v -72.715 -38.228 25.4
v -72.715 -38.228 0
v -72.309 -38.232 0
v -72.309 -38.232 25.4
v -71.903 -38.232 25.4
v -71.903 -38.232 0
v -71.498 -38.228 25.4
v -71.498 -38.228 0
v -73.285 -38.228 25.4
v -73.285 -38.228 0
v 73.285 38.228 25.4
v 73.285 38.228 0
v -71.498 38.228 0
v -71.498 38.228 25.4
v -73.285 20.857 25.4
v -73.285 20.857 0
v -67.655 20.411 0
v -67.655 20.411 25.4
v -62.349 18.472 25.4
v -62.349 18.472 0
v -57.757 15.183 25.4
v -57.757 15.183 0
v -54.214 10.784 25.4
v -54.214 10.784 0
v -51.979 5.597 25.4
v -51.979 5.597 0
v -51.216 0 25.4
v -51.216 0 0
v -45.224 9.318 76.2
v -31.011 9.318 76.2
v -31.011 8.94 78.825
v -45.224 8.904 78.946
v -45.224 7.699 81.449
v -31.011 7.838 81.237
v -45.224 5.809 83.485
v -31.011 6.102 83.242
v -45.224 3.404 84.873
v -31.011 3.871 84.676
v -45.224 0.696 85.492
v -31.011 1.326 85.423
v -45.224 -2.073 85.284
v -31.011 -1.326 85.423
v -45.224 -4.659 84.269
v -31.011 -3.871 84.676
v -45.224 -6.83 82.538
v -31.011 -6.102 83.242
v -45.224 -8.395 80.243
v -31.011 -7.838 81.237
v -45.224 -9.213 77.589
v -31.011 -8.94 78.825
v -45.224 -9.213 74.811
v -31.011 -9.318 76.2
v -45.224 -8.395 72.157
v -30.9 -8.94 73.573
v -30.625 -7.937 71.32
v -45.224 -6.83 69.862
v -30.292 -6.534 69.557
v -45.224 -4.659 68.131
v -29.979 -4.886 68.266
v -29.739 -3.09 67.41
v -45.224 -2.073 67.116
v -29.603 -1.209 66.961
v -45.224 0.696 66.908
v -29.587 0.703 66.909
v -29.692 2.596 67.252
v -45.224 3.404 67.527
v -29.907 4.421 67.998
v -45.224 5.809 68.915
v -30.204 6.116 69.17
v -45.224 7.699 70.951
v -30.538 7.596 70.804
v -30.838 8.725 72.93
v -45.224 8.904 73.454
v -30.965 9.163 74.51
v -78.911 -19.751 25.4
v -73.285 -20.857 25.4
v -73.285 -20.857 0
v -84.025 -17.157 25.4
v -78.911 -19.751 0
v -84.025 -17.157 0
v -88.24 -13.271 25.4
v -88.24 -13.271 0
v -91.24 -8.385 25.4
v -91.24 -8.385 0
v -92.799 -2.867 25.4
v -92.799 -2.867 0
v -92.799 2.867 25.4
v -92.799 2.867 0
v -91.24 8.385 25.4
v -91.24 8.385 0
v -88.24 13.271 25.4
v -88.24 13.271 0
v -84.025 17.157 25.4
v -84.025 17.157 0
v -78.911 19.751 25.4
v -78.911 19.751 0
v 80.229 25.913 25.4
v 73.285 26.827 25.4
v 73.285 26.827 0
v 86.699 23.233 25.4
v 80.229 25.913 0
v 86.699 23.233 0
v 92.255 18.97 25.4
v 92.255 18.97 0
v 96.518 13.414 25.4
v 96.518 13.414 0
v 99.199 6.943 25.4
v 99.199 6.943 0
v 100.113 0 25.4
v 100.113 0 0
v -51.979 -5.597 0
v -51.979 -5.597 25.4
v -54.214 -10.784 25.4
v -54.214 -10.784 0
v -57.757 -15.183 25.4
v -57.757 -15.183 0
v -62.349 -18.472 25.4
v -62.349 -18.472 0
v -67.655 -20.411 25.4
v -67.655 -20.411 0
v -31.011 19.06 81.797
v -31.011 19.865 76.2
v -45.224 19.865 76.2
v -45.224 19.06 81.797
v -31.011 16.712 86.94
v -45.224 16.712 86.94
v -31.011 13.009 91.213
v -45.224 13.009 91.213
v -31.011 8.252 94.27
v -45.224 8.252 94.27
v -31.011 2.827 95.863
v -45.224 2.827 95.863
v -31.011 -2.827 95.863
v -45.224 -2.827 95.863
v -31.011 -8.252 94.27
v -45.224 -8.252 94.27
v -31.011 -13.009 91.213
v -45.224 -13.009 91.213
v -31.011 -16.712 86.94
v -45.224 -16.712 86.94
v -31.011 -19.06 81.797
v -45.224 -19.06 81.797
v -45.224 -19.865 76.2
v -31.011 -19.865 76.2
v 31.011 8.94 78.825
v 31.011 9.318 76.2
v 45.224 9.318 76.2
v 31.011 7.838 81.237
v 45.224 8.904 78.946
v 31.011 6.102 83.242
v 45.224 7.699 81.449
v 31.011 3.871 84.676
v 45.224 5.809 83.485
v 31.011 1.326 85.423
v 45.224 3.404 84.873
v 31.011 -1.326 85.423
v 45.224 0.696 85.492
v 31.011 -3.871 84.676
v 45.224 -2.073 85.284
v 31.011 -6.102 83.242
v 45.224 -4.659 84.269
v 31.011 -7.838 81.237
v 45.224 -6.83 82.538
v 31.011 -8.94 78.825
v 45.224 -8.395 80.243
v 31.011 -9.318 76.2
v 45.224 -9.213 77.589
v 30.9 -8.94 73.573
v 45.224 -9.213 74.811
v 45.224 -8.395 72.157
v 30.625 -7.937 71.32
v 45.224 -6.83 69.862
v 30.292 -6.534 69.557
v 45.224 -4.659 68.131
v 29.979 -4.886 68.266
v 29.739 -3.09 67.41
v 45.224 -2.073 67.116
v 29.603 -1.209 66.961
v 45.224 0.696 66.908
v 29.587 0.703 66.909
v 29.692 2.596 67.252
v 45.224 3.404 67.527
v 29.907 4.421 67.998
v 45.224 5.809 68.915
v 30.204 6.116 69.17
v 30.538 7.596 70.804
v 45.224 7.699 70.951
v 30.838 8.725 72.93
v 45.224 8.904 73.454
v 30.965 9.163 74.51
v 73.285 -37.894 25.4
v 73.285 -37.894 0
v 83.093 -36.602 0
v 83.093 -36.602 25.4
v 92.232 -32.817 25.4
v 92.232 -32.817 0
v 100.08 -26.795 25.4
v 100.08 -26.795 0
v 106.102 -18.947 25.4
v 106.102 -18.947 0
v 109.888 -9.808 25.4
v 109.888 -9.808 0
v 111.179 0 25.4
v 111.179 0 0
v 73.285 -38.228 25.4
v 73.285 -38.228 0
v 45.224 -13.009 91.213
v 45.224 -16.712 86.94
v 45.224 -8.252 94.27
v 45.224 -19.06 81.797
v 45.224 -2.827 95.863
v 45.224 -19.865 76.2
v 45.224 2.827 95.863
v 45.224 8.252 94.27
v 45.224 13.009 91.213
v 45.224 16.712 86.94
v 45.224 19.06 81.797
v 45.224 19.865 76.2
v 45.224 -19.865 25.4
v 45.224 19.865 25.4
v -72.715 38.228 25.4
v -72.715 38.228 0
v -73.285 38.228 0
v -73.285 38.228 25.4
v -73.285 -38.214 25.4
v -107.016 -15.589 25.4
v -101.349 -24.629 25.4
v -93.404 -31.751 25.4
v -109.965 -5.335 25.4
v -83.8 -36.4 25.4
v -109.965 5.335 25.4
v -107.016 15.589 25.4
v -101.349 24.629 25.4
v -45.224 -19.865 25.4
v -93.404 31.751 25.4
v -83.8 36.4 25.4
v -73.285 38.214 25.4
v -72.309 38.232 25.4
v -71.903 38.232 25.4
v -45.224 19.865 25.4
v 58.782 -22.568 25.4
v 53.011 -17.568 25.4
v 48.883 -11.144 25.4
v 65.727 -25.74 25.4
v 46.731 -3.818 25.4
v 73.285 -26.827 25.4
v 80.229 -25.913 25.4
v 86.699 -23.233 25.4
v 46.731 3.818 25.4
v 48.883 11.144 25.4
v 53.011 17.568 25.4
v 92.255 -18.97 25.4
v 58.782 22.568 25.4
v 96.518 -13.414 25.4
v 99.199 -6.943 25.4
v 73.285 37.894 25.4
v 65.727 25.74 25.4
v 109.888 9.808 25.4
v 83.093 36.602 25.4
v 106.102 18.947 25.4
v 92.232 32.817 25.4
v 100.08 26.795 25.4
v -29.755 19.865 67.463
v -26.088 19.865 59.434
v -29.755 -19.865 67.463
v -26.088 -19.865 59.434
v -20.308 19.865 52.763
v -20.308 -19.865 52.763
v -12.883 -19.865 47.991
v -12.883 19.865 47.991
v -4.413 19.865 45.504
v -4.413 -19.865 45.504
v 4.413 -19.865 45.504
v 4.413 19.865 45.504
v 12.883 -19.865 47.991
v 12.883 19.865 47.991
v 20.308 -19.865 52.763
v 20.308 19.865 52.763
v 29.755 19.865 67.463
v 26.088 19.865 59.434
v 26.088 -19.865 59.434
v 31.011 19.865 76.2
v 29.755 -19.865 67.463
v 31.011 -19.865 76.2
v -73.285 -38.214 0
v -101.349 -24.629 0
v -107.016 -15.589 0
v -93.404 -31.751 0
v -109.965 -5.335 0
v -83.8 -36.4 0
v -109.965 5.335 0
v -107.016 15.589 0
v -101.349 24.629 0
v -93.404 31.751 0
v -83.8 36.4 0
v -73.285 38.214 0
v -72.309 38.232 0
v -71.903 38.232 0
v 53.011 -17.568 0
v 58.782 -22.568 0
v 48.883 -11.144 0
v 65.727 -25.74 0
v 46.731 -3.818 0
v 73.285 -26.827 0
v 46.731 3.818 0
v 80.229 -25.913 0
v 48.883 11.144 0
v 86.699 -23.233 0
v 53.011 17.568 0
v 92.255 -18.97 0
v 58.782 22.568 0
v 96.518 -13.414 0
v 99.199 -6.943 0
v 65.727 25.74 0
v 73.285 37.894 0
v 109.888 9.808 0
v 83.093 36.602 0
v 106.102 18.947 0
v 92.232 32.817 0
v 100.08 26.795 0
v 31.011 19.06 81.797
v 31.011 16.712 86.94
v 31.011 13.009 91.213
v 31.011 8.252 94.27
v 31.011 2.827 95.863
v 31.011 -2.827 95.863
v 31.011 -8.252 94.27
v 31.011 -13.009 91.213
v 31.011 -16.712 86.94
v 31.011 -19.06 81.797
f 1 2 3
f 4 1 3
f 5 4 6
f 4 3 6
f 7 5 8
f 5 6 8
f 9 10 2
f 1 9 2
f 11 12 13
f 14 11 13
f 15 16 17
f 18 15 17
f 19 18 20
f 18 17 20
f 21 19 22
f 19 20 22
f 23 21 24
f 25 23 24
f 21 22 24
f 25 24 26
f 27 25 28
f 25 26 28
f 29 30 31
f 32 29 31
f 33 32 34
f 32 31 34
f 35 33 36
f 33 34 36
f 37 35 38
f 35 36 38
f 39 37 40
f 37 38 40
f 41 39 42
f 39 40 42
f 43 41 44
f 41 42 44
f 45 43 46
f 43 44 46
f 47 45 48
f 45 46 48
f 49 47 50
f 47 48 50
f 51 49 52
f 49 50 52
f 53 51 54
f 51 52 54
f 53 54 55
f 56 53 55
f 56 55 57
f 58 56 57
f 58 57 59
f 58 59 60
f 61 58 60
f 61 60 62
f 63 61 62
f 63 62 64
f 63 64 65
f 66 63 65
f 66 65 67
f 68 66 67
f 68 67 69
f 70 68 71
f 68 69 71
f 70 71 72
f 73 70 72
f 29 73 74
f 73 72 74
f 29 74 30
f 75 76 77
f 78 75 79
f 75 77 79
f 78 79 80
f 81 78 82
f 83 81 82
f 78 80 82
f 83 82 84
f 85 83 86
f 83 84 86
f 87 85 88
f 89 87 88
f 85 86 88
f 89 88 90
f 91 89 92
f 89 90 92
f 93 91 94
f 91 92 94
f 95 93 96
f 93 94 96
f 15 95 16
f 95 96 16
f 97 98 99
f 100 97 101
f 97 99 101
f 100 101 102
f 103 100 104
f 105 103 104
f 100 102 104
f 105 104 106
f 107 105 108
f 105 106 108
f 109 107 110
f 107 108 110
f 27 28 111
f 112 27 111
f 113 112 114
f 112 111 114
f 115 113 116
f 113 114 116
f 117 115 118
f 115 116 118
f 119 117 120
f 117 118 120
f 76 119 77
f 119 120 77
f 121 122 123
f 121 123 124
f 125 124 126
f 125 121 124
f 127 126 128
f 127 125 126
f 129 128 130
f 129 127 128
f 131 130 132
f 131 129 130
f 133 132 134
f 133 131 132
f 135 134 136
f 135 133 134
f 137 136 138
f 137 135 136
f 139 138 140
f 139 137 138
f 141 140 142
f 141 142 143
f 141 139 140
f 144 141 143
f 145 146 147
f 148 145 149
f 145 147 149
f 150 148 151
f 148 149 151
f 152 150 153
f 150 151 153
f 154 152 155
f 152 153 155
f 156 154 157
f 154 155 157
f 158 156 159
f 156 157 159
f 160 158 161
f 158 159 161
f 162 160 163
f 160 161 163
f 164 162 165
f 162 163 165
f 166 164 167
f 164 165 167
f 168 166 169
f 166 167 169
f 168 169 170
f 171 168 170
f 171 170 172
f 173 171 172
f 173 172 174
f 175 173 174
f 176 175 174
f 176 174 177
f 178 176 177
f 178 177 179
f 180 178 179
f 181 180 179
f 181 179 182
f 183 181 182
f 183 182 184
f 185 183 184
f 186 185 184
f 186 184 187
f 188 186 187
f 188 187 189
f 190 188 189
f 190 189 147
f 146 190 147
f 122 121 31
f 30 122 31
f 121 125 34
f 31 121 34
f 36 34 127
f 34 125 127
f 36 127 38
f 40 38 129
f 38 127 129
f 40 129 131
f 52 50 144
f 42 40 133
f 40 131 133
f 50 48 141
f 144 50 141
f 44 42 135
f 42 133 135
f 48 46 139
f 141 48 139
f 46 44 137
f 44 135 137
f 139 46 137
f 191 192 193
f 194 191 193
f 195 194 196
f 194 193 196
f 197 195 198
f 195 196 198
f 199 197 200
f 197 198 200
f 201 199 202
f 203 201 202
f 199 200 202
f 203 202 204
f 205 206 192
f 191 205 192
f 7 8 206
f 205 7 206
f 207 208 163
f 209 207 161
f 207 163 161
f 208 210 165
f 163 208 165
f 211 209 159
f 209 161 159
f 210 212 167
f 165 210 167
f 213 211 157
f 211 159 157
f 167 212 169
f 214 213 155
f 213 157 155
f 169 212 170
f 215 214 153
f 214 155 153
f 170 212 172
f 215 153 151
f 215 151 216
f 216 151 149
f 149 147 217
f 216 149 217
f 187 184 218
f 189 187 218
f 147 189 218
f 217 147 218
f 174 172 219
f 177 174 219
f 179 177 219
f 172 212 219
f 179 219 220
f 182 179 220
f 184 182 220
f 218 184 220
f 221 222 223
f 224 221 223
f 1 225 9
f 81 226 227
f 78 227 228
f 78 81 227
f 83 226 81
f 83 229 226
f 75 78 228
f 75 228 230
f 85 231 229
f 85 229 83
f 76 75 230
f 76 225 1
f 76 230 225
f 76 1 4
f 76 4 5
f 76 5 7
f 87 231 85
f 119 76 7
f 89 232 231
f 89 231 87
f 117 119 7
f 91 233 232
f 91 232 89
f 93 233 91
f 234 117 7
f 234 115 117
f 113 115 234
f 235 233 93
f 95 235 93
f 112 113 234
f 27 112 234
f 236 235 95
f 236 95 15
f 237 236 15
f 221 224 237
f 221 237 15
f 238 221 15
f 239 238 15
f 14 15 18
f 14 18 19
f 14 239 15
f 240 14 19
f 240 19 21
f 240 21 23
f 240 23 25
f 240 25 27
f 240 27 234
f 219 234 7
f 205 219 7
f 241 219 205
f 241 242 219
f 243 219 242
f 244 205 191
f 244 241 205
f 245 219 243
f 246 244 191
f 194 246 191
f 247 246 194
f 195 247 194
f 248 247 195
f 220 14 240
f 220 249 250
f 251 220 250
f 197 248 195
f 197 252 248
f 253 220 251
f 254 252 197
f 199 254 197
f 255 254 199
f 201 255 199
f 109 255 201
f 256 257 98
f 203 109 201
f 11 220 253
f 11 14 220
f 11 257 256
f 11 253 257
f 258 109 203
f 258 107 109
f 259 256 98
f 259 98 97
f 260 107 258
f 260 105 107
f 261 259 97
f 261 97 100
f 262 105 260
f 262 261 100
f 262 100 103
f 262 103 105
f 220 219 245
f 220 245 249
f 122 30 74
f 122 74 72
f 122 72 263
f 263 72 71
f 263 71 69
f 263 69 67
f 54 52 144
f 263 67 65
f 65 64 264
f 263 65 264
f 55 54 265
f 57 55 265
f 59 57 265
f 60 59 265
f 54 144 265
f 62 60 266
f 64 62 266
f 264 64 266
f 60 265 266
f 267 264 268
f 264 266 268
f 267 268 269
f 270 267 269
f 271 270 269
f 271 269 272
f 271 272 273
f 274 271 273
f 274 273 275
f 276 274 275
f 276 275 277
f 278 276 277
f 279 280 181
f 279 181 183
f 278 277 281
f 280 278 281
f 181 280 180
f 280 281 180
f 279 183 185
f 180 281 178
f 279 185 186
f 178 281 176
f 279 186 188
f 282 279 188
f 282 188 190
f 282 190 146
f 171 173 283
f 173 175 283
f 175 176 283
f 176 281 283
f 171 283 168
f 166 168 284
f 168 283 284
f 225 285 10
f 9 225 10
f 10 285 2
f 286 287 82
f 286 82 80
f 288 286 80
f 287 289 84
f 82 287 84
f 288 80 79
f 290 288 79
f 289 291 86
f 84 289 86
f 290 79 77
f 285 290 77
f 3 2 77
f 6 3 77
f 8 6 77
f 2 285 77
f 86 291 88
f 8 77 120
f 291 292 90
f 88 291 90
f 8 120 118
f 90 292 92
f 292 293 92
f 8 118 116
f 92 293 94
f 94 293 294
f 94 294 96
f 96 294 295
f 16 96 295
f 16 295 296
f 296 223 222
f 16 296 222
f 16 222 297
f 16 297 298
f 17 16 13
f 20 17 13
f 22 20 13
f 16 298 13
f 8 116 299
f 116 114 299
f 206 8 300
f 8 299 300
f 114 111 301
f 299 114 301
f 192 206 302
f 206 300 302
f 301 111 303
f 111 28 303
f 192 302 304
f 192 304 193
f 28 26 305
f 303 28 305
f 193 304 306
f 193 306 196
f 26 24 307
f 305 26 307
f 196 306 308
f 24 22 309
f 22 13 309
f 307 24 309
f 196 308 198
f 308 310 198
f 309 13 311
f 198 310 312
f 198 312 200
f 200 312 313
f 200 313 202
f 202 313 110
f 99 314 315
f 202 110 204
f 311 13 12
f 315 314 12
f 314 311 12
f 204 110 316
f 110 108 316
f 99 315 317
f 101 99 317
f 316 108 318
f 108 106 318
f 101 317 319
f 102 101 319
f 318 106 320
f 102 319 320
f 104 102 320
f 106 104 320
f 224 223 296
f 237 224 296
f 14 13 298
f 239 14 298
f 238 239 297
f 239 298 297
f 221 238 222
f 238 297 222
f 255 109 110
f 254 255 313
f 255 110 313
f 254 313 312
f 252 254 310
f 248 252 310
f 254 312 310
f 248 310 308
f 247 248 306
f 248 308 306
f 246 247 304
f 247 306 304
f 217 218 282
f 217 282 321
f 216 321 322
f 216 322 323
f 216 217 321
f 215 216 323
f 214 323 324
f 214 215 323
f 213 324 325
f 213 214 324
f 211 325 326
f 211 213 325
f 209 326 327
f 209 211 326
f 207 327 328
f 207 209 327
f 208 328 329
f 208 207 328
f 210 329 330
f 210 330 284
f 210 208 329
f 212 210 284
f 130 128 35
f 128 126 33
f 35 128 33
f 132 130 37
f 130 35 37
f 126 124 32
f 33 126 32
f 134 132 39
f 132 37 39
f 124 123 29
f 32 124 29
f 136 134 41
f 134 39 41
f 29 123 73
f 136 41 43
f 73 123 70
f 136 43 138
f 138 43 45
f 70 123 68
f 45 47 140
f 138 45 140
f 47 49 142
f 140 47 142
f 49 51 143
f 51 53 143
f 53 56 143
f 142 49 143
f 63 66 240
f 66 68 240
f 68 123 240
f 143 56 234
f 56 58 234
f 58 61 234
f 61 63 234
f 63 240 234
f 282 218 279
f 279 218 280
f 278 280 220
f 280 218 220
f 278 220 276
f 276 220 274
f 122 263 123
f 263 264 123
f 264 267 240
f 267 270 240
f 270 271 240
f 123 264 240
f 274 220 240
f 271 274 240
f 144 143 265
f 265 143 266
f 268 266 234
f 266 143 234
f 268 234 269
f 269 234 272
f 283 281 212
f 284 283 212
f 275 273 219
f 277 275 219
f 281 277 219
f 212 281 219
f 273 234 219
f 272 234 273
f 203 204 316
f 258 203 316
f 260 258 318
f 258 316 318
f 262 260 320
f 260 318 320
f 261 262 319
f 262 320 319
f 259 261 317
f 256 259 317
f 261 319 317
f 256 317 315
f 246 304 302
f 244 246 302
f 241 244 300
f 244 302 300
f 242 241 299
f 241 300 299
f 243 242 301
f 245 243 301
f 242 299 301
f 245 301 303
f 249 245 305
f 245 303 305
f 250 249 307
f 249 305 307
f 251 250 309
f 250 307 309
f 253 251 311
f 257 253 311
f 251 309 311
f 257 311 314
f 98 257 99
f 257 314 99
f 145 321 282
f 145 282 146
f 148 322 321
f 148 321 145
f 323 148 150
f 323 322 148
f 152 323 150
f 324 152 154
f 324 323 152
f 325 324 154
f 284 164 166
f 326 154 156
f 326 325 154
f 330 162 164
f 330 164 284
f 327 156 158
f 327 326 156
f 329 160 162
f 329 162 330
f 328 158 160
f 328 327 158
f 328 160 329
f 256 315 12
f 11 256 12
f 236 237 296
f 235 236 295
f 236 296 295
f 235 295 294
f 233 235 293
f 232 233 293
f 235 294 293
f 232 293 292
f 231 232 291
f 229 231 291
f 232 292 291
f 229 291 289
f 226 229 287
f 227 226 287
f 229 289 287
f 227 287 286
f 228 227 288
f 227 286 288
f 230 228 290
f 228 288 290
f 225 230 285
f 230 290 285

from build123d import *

# Parameters (mm, degrees)
F1_DEPTH  = 76.2
F2_DEPTH  = 25.4
F3_R      = 31.0113659553
F4_DEPTH  = 48.768
F5_W      = 14.2128238031
F5_H      = 19.8651105165
F7_W      = 14.2128238031
F7_H      = 19.8651105165
F9_R      = 9.3175662763
F10_DEPTH = 120.904


with BuildPart() as f1:
    # F0 (on Top) → F1 (new body)
    with BuildSketch(Plane.XY):
        with BuildLine():
            ThreePointArc((-39.4395748653, 19.8651105165), (-35.2913919529, 10.3150682913), (-33.8736140697, 0))
            ThreePointArc((-33.8736140697, 0), (-35.2913919529, -10.3150682913), (-39.4395748653, -19.8651105165))
            Line((-39.4395748653, -19.8651105165), (41.0163370235, -19.8651105165))
            ThreePointArc((41.0163370235, -19.8651105165), (35.3919404434, 0), (41.0163370235, 19.8651105165))
            Line((41.0163370235, 19.8651105165), (-39.4395748653, 19.8651105165))
        make_face()
        with BuildLine():
            ThreePointArc((-39.4395748653, -19.8651105165), (-35.2913919529, -10.3150682913), (-33.8736140697, 0))
            ThreePointArc((-33.8736140697, 0), (-35.2913919529, 10.3150682913), (-39.4395748653, 19.8651105165))
            Line((-39.4395748653, 19.8651105165), (-45.2241897583, 19.8651105165))
            Line((-45.2241897583, 19.8651105165), (-45.2241897583, -19.8651105165))
            Line((-45.2241897583, -19.8651105165), (-39.4395748653, -19.8651105165))
        make_face()
        with BuildLine():
            Line((45.2241897583, 19.8651105165), (41.0163370235, 19.8651105165))
            ThreePointArc((41.0163370235, 19.8651105165), (35.3919404434, 0), (41.0163370235, -19.8651105165))
            Line((41.0163370235, -19.8651105165), (45.2241897583, -19.8651105165))
            Line((45.2241897583, -19.8651105165), (45.2241897583, 19.8651105165))
        make_face()
    extrude(amount=F1_DEPTH)

    # F0 (on Top) → F2 (join)
    with BuildSketch(Plane.XY):
        with BuildLine():
            Line((-45.2241897583, 19.8651105165), (-39.4395748653, 19.8651105165))
            ThreePointArc((-39.4395748653, 19.8651105165), (-53.1034448807, 33.1757028633), (-71.4977306772, 38.2277779281))
            Line((-71.4977306772, 38.2277779281), (-72.7147387814, 38.2277779281))
            ThreePointArc((-72.7147387814, 38.2277779281), (-73.0001282654, 38.2221694419), (-73.2854679227, 38.2144304102))
            Line((-73.2854679227, 38.2144304102), (-73.2854679227, 20.8573796838))
            ThreePointArc((-73.2854679227, 20.8573796838), (-57.7572646523, 15.1831464436), (-51.2155459374, 0))
            ThreePointArc((-51.2155459374, 0), (-57.7572646523, -15.1831464436), (-73.2854679227, -20.8573796838))
            Line((-73.2854679227, -20.8573796838), (-73.2854679227, -38.2144304102))
            ThreePointArc((-73.2854679227, -38.2144304102), (-73.0001282654, -38.2221694419), (-72.7147387814, -38.2277779281))
            Line((-72.7147387814, -38.2277779281), (-71.4977306772, -38.2277779281))
            ThreePointArc((-71.4977306772, -38.2277779281), (-53.1034448807, -33.1757028633), (-39.4395748653, -19.8651105165))
            Line((-39.4395748653, -19.8651105165), (-45.2241897583, -19.8651105165))
            Line((-45.2241897583, -19.8651105165), (-45.2241897583, 19.8651105165))
        make_face()
        with BuildLine():
            ThreePointArc((-71.4977306772, 38.2277779281), (-53.1034448807, 33.1757028633), (-39.4395748653, 19.8651105165))
            Line((-39.4395748653, 19.8651105165), (41.0163370235, 19.8651105165))
            ThreePointArc((41.0163370235, 19.8651105165), (54.80358066, 33.0807990839), (73.2854679227, 37.8935274793))
            Line((73.2854679227, 37.8935274793), (73.2854679227, 38.2277779281))
            Line((73.2854679227, 38.2277779281), (-71.4977306772, 38.2277779281))
        make_face()
        with BuildLine():
            Line((41.0163370235, -19.8651105165), (-39.4395748653, -19.8651105165))
            ThreePointArc((-39.4395748653, -19.8651105165), (-53.1034448807, -33.1757028633), (-71.4977306772, -38.2277779281))
            Line((-71.4977306772, -38.2277779281), (73.2854679227, -38.2277779281))
            Line((73.2854679227, -38.2277779281), (73.2854679227, -37.8935274793))
            ThreePointArc((73.2854679227, -37.8935274793), (54.80358066, -33.0807990839), (41.0163370235, -19.8651105165))
        make_face()
        with BuildLine():
            Line((-72.7147387814, 38.2277779281), (-71.4977306772, 38.2277779281))
            ThreePointArc((-71.4977306772, 38.2277779281), (-72.1062347293, 38.2326206596), (-72.7147387814, 38.2277779281))
        make_face()
        with BuildLine():
            ThreePointArc((73.2854679227, 37.8935274793), (54.80358066, 33.0807990839), (41.0163370235, 19.8651105165))
            Line((41.0163370235, 19.8651105165), (45.2241897583, 19.8651105165))
            Line((45.2241897583, 19.8651105165), (45.2241897583, -19.8651105165))
            Line((45.2241897583, -19.8651105165), (41.0163370235, -19.8651105165))
            ThreePointArc((41.0163370235, -19.8651105165), (54.80358066, -33.0807990839), (73.2854679227, -37.8935274793))
            Line((73.2854679227, -37.8935274793), (73.2854679227, -26.8271780999))
            ThreePointArc((73.2854679227, -26.8271780999), (46.4582898228, 0), (73.2854679227, 26.8271780999))
            Line((73.2854679227, 26.8271780999), (73.2854679227, 37.8935274793))
        make_face()
        with BuildLine():
            ThreePointArc((-72.7147387814, -38.2277779281), (-72.1062347293, -38.2326206596), (-71.4977306772, -38.2277779281))
            Line((-71.4977306772, -38.2277779281), (-72.7147387814, -38.2277779281))
        make_face()
        with BuildLine():
            ThreePointArc((-73.2854679227, 38.2144304102), (-73.0001282654, 38.2221694419), (-72.7147387814, 38.2277779281))
            Line((-72.7147387814, 38.2277779281), (-73.2854679227, 38.2277779281))
            Line((-73.2854679227, 38.2277779281), (-73.2854679227, 38.2144304102))
        make_face()
        with BuildLine():
            ThreePointArc((111.178995402, 0), (100.0802381664, 26.7947702437), (73.2854679227, 37.8935274793))
            Line((73.2854679227, 37.8935274793), (73.2854679227, 26.8271780999))
            ThreePointArc((73.2854679227, 26.8271780999), (92.2551474772, 18.9696795545), (100.1126460226, 0))
            ThreePointArc((100.1126460226, 0), (92.2551474772, -18.9696795545), (73.2854679227, -26.8271780999))
            Line((73.2854679227, -26.8271780999), (73.2854679227, -37.8935274793))
            ThreePointArc((73.2854679227, -37.8935274793), (100.0802381664, -26.7947702437), (111.178995402, 0))
        make_face()
        with BuildLine():
            Line((-73.2854679227, -38.2277779281), (-72.7147387814, -38.2277779281))
            ThreePointArc((-72.7147387814, -38.2277779281), (-73.0001282654, -38.2221694419), (-73.2854679227, -38.2144304102))
            Line((-73.2854679227, -38.2144304102), (-73.2854679227, -38.2277779281))
        make_face()
        with BuildLine():
            Line((-73.2854679227, 20.8573796838), (-73.2854679227, 38.2144304102))
            ThreePointArc((-73.2854679227, 38.2144304102), (-110.3388553889, 0), (-73.2854679227, -38.2144304102))
            Line((-73.2854679227, -38.2144304102), (-73.2854679227, -20.8573796838))
            ThreePointArc((-73.2854679227, -20.8573796838), (-92.9969235211, 0), (-73.2854679227, 20.8573796838))
        make_face()
    extrude(amount=F2_DEPTH)

    # F3 (on face) → F4 (cut)
    with BuildSketch(Plane.XZ.offset(19.8651105165)):
        with Locations((0, 76.2)):
            Circle(F3_R)
    extrude(amount=-F4_DEPTH, mode=Mode.SUBTRACT)

    # F5 (on face) → F6 (revolve)
    with BuildSketch(Plane.XY.offset(76.2)):
        with Locations((-38.1177778568, 9.9325552583)):
            Rectangle(F5_W, F5_H)
    revolve(axis=Axis((-38.1177778568, 0, 76.2), (1, 0, 0)))

    # F7 (on face) → F8 (revolve)
    with BuildSketch(Plane.XY.offset(76.2)):
        with Locations((38.1177778568, 9.9325552583)):
            Rectangle(F7_W, F7_H)
    revolve(axis=Axis((38.1177778568, 0, 76.2), (1, 0, 0)))

    # F9 (on face) → F10 (cut)
    with BuildSketch(Plane.YZ.offset(45.2241897583)):
        with Locations((0, 76.2)):
            Circle(F9_R)
    extrude(amount=-F10_DEPTH, mode=Mode.SUBTRACT)


solid = f1.part
